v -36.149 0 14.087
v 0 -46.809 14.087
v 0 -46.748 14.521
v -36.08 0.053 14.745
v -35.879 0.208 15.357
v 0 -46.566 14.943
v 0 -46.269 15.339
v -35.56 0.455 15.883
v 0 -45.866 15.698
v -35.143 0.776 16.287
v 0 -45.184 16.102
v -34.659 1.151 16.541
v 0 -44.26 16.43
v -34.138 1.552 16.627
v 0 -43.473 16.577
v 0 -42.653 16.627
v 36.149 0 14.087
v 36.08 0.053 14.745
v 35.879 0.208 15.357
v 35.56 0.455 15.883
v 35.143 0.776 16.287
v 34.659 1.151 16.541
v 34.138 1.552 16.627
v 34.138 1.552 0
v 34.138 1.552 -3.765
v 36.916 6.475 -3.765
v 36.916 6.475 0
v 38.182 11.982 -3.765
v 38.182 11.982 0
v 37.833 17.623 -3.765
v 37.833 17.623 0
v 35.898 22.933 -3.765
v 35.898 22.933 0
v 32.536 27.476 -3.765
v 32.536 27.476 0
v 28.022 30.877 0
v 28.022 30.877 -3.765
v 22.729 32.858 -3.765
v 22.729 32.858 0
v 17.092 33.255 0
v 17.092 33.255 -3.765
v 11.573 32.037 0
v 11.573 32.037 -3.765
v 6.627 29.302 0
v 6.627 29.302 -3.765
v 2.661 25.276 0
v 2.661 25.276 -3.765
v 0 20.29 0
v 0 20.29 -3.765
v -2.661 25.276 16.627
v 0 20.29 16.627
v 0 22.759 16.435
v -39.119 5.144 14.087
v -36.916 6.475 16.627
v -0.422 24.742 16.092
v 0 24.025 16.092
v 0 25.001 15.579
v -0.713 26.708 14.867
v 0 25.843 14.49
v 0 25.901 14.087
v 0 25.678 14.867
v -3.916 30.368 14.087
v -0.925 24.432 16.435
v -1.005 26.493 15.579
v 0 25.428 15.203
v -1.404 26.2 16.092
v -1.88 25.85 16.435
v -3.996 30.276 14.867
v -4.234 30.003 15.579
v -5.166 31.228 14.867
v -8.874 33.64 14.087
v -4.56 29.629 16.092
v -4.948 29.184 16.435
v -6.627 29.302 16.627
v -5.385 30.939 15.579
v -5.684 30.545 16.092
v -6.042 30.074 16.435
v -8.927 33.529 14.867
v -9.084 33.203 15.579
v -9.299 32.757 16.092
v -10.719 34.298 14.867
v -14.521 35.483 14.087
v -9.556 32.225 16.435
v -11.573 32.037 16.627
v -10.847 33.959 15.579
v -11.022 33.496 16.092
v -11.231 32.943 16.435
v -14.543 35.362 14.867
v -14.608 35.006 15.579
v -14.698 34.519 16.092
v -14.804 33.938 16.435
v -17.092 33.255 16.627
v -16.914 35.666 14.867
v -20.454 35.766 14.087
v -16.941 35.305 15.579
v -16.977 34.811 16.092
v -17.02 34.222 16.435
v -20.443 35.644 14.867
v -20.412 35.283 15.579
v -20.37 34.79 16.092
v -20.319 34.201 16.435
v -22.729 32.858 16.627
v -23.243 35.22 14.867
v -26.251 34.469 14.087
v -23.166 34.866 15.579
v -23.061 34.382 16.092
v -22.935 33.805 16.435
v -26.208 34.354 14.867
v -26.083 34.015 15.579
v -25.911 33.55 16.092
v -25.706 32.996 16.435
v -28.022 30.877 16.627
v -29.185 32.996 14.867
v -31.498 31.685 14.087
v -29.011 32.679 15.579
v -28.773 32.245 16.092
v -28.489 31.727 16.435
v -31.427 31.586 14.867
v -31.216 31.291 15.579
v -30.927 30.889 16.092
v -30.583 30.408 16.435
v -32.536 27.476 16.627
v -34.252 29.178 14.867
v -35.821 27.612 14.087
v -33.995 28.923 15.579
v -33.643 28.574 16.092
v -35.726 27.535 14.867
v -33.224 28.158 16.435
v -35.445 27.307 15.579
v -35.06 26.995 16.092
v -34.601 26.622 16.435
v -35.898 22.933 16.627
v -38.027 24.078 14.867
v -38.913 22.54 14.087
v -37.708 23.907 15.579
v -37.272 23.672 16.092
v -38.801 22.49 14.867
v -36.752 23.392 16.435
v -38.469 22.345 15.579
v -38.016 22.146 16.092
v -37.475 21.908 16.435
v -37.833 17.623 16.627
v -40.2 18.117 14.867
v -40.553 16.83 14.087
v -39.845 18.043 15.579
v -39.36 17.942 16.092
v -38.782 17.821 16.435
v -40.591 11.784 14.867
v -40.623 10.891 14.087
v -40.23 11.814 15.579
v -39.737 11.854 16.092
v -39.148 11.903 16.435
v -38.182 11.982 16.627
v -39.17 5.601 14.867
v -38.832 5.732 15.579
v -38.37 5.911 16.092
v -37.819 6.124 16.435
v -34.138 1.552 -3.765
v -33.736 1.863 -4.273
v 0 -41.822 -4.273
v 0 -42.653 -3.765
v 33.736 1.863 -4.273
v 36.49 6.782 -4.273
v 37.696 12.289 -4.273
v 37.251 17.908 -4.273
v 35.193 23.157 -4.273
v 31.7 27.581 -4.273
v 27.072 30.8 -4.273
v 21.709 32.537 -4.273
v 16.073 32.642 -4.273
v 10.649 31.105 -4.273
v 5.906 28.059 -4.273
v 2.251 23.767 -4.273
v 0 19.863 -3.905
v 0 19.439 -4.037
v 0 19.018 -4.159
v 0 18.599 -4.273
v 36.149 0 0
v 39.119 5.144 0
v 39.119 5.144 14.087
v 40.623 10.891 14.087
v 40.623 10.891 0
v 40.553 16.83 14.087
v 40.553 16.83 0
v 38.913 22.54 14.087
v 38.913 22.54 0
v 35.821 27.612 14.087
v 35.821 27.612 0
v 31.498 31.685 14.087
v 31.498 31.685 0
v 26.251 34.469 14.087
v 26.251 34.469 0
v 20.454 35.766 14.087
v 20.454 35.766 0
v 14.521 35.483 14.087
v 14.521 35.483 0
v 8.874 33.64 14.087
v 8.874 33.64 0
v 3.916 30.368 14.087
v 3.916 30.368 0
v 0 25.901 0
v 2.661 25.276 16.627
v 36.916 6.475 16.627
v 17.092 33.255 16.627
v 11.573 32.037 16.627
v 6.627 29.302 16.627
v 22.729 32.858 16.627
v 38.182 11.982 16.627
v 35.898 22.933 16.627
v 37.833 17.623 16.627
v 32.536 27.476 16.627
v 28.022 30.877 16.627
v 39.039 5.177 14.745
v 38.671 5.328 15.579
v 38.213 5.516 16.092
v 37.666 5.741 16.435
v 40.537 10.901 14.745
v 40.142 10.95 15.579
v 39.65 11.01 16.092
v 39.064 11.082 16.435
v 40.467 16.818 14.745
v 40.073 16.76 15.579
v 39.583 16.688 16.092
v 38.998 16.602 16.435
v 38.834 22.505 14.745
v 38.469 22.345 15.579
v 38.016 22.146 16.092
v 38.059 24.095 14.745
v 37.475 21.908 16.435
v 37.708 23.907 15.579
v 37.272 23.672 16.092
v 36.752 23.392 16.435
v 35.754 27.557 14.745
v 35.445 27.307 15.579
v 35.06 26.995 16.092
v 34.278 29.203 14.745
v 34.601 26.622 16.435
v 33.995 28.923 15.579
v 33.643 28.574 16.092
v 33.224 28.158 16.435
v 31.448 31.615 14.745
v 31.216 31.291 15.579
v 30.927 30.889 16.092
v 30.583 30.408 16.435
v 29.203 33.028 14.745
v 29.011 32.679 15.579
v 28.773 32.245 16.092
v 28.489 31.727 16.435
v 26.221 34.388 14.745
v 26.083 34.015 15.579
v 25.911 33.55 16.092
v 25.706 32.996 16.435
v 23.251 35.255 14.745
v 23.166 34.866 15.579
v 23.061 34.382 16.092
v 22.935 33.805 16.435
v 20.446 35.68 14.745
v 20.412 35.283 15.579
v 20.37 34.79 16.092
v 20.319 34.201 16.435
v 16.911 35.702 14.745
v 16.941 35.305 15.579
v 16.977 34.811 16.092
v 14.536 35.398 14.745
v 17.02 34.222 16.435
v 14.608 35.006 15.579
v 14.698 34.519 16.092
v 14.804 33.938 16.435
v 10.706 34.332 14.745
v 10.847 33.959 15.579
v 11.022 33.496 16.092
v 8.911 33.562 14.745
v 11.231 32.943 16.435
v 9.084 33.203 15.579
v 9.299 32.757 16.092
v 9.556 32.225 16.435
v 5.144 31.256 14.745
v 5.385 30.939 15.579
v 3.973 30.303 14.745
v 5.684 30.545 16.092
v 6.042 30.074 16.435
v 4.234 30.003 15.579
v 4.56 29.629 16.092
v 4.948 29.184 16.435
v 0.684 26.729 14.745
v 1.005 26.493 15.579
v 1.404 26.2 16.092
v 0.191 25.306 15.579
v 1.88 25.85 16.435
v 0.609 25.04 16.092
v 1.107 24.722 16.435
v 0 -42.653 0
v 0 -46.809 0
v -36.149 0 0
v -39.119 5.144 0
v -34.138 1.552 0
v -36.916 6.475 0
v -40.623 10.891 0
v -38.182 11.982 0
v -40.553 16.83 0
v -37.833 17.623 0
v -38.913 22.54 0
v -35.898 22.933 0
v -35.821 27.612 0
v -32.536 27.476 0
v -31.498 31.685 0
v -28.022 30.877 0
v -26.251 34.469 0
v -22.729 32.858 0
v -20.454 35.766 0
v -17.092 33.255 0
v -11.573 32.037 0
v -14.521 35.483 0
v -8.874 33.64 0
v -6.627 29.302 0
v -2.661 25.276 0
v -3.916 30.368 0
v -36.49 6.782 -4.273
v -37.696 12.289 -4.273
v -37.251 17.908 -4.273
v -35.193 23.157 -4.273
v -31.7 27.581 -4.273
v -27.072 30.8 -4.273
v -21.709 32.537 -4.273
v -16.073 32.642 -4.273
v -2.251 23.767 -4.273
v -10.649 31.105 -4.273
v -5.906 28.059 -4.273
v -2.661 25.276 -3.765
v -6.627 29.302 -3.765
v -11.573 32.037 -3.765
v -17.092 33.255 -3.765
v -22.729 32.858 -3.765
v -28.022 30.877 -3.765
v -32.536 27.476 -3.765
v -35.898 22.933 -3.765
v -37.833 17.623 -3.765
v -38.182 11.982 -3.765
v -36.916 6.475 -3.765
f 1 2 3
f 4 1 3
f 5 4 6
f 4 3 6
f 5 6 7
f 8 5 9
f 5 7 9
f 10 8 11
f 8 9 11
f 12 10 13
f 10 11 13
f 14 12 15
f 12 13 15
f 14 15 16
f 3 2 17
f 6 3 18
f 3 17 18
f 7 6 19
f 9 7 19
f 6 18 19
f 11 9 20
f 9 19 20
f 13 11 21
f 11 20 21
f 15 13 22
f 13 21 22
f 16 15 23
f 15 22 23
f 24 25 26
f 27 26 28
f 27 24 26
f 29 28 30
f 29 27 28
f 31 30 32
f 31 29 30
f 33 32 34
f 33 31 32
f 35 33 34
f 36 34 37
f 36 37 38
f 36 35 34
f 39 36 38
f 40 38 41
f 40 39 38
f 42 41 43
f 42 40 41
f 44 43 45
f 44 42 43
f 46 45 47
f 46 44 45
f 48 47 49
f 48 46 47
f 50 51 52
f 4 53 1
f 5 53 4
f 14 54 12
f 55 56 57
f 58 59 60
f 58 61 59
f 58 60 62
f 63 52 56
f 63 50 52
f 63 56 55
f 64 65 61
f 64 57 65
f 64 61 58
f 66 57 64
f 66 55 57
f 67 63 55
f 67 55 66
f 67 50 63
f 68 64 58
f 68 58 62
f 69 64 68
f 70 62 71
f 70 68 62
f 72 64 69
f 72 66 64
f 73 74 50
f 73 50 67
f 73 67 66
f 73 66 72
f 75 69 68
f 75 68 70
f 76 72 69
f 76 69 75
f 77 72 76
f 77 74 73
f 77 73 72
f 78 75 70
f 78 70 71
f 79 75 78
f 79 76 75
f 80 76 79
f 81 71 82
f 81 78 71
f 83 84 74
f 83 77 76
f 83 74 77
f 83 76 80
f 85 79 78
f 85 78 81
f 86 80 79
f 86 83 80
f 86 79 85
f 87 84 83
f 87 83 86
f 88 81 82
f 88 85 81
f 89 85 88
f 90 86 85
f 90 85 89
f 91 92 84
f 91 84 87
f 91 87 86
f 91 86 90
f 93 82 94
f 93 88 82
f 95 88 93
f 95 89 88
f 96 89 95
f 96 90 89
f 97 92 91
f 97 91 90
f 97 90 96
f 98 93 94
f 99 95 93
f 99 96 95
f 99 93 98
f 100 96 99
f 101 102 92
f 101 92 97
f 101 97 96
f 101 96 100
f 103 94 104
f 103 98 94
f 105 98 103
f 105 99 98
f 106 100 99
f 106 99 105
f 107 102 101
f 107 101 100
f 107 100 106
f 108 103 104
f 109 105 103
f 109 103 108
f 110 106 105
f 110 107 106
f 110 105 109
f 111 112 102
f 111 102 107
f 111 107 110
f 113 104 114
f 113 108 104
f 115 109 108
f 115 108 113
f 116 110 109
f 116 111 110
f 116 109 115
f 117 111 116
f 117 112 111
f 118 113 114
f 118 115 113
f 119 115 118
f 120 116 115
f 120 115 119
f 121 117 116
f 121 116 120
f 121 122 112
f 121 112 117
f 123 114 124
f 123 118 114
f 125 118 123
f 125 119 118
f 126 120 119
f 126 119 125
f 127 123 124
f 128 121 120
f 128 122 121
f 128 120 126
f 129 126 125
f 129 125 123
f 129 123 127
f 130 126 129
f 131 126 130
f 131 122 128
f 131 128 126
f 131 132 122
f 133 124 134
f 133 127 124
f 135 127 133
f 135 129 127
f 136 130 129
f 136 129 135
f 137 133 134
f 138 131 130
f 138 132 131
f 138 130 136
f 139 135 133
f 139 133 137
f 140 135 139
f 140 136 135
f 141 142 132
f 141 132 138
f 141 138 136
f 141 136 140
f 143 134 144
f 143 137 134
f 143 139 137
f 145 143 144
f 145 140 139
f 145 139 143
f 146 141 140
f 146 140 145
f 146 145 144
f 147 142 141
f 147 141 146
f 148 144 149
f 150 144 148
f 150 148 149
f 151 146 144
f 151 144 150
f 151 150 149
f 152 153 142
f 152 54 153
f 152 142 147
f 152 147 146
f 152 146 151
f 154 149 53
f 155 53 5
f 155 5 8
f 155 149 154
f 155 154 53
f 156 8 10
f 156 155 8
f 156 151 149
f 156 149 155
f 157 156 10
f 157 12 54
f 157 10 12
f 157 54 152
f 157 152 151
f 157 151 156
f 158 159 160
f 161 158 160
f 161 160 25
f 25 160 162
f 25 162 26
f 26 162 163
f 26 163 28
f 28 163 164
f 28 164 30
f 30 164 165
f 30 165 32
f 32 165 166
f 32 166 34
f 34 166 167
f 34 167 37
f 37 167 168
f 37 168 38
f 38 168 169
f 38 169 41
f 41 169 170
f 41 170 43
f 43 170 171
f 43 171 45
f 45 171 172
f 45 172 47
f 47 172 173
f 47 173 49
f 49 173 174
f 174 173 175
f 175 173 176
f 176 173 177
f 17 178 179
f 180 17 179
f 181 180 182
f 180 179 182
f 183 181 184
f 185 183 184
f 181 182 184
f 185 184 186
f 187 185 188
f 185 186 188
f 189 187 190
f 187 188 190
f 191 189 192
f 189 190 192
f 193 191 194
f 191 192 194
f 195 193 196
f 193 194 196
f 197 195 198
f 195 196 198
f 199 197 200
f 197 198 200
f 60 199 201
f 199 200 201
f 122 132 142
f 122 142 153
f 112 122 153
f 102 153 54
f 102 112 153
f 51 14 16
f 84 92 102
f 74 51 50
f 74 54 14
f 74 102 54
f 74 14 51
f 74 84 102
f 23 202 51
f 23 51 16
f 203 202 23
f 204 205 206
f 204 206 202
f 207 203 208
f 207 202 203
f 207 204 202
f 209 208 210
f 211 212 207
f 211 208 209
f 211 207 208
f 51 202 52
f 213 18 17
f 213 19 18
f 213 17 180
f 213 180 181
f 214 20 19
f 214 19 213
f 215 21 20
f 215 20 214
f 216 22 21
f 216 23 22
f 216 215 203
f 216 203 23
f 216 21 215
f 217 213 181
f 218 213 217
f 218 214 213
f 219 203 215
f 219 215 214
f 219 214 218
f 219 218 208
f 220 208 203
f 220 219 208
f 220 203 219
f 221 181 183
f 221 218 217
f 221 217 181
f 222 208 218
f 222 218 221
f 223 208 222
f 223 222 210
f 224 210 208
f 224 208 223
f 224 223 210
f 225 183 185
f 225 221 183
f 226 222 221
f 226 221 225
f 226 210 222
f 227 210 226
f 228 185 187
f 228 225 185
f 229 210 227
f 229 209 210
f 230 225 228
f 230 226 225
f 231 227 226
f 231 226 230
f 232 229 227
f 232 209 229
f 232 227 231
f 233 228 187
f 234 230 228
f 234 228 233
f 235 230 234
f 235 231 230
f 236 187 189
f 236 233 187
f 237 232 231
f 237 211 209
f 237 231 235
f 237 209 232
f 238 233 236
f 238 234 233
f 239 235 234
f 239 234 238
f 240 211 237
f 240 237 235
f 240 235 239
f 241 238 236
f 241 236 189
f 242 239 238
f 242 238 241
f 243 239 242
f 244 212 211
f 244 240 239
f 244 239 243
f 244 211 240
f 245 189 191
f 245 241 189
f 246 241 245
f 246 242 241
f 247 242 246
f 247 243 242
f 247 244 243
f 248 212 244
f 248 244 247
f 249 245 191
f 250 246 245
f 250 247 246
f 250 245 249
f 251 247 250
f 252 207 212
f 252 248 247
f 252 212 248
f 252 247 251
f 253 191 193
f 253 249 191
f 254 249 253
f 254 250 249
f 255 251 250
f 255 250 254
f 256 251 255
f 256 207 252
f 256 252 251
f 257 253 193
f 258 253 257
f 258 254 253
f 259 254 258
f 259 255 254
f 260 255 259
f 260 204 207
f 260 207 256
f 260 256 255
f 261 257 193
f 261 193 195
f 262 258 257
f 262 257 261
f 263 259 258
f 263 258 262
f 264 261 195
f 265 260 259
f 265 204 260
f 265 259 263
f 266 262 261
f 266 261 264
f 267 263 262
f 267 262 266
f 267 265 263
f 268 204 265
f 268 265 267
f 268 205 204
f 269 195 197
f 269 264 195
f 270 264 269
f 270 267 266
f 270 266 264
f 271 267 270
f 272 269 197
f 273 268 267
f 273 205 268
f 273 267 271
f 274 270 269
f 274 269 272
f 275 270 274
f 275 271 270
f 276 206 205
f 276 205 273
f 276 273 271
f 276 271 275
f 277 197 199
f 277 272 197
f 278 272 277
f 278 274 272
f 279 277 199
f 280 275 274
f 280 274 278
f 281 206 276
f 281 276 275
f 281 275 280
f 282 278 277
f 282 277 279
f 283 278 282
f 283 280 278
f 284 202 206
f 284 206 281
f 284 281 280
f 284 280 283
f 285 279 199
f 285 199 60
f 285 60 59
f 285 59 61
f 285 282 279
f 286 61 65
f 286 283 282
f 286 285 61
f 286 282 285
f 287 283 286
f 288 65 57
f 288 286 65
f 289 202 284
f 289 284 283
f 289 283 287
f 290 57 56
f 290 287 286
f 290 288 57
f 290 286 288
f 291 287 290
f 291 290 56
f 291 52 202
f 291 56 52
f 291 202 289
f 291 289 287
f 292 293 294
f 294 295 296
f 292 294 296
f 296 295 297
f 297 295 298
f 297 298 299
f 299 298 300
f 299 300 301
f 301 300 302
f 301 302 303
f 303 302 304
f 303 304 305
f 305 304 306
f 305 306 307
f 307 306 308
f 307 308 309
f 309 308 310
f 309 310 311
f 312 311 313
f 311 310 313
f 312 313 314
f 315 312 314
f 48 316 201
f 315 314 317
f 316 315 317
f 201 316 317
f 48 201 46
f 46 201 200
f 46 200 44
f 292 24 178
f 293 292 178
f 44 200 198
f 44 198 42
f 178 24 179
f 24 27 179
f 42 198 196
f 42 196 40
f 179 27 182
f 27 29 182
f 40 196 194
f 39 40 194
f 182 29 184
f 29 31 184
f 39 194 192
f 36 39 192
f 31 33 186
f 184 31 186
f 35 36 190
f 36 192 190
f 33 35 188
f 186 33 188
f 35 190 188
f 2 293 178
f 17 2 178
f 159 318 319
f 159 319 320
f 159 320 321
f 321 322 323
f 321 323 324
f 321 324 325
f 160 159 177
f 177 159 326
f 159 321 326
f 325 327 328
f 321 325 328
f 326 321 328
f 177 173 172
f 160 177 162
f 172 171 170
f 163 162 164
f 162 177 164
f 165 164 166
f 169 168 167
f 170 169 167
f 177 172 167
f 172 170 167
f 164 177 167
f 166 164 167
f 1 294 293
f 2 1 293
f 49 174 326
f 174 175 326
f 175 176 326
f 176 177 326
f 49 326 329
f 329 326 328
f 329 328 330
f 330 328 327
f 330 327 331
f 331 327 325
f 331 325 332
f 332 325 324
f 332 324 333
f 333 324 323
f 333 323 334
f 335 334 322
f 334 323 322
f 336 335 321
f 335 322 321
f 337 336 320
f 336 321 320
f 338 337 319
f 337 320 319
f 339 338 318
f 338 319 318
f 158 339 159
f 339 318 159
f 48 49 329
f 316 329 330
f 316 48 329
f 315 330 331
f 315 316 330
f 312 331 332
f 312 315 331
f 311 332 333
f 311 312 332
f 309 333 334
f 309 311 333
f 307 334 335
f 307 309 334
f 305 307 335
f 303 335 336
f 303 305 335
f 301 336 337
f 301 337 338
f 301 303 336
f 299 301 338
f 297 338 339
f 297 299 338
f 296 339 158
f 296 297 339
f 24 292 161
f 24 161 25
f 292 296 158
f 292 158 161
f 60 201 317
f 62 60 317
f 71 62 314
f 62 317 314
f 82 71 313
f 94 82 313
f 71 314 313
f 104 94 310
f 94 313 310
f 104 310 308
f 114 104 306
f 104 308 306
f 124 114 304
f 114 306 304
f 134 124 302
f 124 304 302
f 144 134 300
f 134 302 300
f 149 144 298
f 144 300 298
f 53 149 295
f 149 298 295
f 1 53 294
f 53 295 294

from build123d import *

# Parameters (mm, degrees)
F1_DEPTH = 16.6271422058
F2_R     = 2.54
F3_DEPTH = 20.8997240989
F4_SIZE2 = 0.508
F4_SIZE  = 0.508


with BuildPart() as f1:
    # F0 (on Top) → F1 (new body)
    with BuildSketch(Plane.XY):
        with BuildLine():
            Line((-36.148622632, 0), (0, -46.8087121844))
            Line((0, -46.8087121844), (36.148622632, 0))
            ThreePointArc((36.148622632, 0), (31.497984523, 31.6851542178), (0, 25.9011760354))
            ThreePointArc((0, 25.9011760354), (-31.497984523, 31.6851542178), (-36.148622632, 0))
        make_face()
    extrude(amount=F1_DEPTH)

    # F2
    f2_edges = [f1.edges().sort_by_distance(p)[0] for p in [
        (-31.497985, 31.685154, 16.627142),
        (-18.074311, -23.404356, 16.627142),
        (18.074311, -23.404356, 16.627142),
        (31.497985, 31.685154, 16.627142),
    ]]
    fillet(f2_edges, radius=F2_R)

    # F3 (add): a face of the model
    f3_faces = [f1.faces().sort_by_distance(p)[0] for p in [
        (0, 3.7630845429, 16.6271422058),
    ]]
    extrude(f3_faces, amount=-F3_DEPTH)

    # F4
    f4_edges = [f1.edges().sort_by_distance(p)[0] for p in [
        (-28.022292, 30.877177, -4.272582),
        (28.022292, 30.877177, -4.272582),
        (-17.069153, -20.550289, -4.272582),
        (17.069153, -20.550289, -4.272582),
    ]]
    chamfer(f4_edges, length=F4_SIZE, length2=F4_SIZE2)


solid = f1.part
